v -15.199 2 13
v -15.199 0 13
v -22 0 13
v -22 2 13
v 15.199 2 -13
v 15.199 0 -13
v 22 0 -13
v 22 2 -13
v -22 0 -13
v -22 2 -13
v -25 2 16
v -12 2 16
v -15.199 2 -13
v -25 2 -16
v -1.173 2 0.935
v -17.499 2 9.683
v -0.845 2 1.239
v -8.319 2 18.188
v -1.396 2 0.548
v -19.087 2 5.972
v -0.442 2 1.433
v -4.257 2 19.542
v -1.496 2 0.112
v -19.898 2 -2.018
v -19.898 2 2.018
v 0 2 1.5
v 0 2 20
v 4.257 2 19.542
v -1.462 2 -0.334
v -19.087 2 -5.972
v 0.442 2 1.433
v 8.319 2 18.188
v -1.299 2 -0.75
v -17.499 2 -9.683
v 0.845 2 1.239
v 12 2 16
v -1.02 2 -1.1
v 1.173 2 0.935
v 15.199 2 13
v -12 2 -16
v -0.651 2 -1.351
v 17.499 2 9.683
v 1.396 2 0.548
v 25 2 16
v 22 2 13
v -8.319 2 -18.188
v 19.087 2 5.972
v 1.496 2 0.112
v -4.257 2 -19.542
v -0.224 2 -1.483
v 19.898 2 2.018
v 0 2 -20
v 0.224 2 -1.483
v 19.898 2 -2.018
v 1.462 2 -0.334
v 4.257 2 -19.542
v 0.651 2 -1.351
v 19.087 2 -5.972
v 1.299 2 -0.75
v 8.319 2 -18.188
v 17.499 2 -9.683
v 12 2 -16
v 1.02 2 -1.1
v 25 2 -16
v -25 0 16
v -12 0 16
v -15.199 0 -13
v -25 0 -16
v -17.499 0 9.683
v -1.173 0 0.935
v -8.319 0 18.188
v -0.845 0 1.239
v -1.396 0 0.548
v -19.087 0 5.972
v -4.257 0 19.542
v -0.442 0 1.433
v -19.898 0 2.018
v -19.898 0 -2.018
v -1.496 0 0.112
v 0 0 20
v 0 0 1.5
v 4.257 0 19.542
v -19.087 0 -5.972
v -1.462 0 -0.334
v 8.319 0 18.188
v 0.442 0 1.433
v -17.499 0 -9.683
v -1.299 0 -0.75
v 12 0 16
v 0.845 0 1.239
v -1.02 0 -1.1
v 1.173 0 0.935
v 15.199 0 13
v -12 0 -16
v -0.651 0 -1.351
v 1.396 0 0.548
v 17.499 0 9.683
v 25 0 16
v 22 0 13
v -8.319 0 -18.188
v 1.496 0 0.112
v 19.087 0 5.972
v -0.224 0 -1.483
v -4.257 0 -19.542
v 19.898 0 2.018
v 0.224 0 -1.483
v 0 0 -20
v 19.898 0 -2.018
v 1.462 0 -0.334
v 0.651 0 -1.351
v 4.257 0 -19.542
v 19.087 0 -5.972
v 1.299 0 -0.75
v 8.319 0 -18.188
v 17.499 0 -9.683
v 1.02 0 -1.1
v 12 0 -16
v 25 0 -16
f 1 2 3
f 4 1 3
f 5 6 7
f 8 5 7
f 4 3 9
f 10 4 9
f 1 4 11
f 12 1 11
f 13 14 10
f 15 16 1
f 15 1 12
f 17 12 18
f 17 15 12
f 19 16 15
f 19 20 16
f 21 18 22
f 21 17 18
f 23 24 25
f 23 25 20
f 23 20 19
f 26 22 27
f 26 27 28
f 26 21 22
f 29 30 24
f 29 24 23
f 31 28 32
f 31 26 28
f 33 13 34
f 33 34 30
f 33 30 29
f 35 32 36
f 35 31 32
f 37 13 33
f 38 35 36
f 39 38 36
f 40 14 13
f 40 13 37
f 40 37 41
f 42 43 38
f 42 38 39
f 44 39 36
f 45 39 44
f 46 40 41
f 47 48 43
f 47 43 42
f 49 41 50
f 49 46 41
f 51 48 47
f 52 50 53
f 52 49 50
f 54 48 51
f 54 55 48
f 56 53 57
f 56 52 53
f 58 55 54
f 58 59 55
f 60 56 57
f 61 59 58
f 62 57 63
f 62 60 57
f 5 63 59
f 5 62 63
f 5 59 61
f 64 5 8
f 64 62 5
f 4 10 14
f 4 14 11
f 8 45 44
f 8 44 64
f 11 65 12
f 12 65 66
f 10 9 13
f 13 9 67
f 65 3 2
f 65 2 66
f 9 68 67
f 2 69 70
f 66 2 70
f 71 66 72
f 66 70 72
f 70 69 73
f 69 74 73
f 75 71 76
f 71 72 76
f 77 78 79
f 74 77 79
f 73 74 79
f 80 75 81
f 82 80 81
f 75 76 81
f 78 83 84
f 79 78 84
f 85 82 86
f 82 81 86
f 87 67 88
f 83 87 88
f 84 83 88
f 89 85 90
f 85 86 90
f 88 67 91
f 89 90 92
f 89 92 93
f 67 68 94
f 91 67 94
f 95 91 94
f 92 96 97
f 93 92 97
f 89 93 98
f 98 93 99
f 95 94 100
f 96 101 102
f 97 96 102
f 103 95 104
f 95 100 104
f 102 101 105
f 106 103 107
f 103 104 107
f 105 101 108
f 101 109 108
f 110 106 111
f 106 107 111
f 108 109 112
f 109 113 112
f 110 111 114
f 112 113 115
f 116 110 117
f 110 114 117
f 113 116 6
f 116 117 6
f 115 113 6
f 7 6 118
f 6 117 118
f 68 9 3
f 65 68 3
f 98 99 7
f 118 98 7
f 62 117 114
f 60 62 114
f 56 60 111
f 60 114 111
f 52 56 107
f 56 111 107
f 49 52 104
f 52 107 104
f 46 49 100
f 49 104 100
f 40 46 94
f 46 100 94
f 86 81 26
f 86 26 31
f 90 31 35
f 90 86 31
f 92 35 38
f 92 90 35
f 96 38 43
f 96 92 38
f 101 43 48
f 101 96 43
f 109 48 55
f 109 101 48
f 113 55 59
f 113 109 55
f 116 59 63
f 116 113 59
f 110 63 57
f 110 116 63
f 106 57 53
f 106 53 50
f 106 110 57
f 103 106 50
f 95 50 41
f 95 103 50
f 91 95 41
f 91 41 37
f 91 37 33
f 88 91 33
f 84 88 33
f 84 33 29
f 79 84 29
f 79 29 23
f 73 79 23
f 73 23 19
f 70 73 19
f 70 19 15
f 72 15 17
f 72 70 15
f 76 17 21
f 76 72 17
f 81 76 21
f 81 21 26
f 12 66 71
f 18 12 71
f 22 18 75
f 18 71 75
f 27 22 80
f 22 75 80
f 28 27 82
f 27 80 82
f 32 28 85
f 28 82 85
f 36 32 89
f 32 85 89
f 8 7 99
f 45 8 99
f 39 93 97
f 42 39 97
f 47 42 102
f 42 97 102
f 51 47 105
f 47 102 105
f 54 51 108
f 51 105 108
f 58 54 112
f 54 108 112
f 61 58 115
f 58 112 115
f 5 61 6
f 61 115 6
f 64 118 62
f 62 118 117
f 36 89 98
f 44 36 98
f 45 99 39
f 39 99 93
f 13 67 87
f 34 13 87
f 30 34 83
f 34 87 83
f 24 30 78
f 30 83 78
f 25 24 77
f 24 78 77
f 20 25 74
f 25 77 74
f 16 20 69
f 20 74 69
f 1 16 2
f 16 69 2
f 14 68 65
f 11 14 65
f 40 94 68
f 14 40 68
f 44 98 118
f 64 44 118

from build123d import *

# Parameters (mm, degrees)
SKETCH1_R           = 1.5
BOSS_EXTRUDE1_DEPTH = 2


with BuildPart() as part:
    # Sketch1 → Boss-Extrude1 (new body)
    with BuildSketch(Plane(origin=(0, 0, 0), x_dir=(1, 0, 0), z_dir=(0, 1, 0))):
        with BuildLine():
            Line((-25, -16), (-12, -16))
            ThreePointArc((-12, -16), (0, -20), (12, -16))
            Line((12, -16), (25, -16))
            Line((25, -16), (25, 16))
            Line((25, 16), (12, 16))
            ThreePointArc((12, 16), (0, 20), (-12, 16))
            Line((-12, 16), (-25, 16))
            Line((-25, 16), (-25, -16))
        make_face()
        with BuildLine():
            Line((-22, 13), (-15.198684154, 13))
            ThreePointArc((-15.198684154, 13), (-20, 0), (-15.198684154, -13))
            Line((-15.198684154, -13), (-22, -13))
            Line((-22, -13), (-22, 13))
        make_face(mode=Mode.SUBTRACT)
        with BuildLine():
            ThreePointArc((15.198684154, -13), (20, 0), (15.198684154, 13))
            Line((15.198684154, 13), (22, 13))
            Line((22, 13), (22, -13))
            Line((22, -13), (15.198684154, -13))
        make_face(mode=Mode.SUBTRACT)
        with Locations(Location((0, 0, 0), (0, 0, 270))):
            Circle(SKETCH1_R, mode=Mode.SUBTRACT)
    extrude(amount=BOSS_EXTRUDE1_DEPTH)


solid = part.part
